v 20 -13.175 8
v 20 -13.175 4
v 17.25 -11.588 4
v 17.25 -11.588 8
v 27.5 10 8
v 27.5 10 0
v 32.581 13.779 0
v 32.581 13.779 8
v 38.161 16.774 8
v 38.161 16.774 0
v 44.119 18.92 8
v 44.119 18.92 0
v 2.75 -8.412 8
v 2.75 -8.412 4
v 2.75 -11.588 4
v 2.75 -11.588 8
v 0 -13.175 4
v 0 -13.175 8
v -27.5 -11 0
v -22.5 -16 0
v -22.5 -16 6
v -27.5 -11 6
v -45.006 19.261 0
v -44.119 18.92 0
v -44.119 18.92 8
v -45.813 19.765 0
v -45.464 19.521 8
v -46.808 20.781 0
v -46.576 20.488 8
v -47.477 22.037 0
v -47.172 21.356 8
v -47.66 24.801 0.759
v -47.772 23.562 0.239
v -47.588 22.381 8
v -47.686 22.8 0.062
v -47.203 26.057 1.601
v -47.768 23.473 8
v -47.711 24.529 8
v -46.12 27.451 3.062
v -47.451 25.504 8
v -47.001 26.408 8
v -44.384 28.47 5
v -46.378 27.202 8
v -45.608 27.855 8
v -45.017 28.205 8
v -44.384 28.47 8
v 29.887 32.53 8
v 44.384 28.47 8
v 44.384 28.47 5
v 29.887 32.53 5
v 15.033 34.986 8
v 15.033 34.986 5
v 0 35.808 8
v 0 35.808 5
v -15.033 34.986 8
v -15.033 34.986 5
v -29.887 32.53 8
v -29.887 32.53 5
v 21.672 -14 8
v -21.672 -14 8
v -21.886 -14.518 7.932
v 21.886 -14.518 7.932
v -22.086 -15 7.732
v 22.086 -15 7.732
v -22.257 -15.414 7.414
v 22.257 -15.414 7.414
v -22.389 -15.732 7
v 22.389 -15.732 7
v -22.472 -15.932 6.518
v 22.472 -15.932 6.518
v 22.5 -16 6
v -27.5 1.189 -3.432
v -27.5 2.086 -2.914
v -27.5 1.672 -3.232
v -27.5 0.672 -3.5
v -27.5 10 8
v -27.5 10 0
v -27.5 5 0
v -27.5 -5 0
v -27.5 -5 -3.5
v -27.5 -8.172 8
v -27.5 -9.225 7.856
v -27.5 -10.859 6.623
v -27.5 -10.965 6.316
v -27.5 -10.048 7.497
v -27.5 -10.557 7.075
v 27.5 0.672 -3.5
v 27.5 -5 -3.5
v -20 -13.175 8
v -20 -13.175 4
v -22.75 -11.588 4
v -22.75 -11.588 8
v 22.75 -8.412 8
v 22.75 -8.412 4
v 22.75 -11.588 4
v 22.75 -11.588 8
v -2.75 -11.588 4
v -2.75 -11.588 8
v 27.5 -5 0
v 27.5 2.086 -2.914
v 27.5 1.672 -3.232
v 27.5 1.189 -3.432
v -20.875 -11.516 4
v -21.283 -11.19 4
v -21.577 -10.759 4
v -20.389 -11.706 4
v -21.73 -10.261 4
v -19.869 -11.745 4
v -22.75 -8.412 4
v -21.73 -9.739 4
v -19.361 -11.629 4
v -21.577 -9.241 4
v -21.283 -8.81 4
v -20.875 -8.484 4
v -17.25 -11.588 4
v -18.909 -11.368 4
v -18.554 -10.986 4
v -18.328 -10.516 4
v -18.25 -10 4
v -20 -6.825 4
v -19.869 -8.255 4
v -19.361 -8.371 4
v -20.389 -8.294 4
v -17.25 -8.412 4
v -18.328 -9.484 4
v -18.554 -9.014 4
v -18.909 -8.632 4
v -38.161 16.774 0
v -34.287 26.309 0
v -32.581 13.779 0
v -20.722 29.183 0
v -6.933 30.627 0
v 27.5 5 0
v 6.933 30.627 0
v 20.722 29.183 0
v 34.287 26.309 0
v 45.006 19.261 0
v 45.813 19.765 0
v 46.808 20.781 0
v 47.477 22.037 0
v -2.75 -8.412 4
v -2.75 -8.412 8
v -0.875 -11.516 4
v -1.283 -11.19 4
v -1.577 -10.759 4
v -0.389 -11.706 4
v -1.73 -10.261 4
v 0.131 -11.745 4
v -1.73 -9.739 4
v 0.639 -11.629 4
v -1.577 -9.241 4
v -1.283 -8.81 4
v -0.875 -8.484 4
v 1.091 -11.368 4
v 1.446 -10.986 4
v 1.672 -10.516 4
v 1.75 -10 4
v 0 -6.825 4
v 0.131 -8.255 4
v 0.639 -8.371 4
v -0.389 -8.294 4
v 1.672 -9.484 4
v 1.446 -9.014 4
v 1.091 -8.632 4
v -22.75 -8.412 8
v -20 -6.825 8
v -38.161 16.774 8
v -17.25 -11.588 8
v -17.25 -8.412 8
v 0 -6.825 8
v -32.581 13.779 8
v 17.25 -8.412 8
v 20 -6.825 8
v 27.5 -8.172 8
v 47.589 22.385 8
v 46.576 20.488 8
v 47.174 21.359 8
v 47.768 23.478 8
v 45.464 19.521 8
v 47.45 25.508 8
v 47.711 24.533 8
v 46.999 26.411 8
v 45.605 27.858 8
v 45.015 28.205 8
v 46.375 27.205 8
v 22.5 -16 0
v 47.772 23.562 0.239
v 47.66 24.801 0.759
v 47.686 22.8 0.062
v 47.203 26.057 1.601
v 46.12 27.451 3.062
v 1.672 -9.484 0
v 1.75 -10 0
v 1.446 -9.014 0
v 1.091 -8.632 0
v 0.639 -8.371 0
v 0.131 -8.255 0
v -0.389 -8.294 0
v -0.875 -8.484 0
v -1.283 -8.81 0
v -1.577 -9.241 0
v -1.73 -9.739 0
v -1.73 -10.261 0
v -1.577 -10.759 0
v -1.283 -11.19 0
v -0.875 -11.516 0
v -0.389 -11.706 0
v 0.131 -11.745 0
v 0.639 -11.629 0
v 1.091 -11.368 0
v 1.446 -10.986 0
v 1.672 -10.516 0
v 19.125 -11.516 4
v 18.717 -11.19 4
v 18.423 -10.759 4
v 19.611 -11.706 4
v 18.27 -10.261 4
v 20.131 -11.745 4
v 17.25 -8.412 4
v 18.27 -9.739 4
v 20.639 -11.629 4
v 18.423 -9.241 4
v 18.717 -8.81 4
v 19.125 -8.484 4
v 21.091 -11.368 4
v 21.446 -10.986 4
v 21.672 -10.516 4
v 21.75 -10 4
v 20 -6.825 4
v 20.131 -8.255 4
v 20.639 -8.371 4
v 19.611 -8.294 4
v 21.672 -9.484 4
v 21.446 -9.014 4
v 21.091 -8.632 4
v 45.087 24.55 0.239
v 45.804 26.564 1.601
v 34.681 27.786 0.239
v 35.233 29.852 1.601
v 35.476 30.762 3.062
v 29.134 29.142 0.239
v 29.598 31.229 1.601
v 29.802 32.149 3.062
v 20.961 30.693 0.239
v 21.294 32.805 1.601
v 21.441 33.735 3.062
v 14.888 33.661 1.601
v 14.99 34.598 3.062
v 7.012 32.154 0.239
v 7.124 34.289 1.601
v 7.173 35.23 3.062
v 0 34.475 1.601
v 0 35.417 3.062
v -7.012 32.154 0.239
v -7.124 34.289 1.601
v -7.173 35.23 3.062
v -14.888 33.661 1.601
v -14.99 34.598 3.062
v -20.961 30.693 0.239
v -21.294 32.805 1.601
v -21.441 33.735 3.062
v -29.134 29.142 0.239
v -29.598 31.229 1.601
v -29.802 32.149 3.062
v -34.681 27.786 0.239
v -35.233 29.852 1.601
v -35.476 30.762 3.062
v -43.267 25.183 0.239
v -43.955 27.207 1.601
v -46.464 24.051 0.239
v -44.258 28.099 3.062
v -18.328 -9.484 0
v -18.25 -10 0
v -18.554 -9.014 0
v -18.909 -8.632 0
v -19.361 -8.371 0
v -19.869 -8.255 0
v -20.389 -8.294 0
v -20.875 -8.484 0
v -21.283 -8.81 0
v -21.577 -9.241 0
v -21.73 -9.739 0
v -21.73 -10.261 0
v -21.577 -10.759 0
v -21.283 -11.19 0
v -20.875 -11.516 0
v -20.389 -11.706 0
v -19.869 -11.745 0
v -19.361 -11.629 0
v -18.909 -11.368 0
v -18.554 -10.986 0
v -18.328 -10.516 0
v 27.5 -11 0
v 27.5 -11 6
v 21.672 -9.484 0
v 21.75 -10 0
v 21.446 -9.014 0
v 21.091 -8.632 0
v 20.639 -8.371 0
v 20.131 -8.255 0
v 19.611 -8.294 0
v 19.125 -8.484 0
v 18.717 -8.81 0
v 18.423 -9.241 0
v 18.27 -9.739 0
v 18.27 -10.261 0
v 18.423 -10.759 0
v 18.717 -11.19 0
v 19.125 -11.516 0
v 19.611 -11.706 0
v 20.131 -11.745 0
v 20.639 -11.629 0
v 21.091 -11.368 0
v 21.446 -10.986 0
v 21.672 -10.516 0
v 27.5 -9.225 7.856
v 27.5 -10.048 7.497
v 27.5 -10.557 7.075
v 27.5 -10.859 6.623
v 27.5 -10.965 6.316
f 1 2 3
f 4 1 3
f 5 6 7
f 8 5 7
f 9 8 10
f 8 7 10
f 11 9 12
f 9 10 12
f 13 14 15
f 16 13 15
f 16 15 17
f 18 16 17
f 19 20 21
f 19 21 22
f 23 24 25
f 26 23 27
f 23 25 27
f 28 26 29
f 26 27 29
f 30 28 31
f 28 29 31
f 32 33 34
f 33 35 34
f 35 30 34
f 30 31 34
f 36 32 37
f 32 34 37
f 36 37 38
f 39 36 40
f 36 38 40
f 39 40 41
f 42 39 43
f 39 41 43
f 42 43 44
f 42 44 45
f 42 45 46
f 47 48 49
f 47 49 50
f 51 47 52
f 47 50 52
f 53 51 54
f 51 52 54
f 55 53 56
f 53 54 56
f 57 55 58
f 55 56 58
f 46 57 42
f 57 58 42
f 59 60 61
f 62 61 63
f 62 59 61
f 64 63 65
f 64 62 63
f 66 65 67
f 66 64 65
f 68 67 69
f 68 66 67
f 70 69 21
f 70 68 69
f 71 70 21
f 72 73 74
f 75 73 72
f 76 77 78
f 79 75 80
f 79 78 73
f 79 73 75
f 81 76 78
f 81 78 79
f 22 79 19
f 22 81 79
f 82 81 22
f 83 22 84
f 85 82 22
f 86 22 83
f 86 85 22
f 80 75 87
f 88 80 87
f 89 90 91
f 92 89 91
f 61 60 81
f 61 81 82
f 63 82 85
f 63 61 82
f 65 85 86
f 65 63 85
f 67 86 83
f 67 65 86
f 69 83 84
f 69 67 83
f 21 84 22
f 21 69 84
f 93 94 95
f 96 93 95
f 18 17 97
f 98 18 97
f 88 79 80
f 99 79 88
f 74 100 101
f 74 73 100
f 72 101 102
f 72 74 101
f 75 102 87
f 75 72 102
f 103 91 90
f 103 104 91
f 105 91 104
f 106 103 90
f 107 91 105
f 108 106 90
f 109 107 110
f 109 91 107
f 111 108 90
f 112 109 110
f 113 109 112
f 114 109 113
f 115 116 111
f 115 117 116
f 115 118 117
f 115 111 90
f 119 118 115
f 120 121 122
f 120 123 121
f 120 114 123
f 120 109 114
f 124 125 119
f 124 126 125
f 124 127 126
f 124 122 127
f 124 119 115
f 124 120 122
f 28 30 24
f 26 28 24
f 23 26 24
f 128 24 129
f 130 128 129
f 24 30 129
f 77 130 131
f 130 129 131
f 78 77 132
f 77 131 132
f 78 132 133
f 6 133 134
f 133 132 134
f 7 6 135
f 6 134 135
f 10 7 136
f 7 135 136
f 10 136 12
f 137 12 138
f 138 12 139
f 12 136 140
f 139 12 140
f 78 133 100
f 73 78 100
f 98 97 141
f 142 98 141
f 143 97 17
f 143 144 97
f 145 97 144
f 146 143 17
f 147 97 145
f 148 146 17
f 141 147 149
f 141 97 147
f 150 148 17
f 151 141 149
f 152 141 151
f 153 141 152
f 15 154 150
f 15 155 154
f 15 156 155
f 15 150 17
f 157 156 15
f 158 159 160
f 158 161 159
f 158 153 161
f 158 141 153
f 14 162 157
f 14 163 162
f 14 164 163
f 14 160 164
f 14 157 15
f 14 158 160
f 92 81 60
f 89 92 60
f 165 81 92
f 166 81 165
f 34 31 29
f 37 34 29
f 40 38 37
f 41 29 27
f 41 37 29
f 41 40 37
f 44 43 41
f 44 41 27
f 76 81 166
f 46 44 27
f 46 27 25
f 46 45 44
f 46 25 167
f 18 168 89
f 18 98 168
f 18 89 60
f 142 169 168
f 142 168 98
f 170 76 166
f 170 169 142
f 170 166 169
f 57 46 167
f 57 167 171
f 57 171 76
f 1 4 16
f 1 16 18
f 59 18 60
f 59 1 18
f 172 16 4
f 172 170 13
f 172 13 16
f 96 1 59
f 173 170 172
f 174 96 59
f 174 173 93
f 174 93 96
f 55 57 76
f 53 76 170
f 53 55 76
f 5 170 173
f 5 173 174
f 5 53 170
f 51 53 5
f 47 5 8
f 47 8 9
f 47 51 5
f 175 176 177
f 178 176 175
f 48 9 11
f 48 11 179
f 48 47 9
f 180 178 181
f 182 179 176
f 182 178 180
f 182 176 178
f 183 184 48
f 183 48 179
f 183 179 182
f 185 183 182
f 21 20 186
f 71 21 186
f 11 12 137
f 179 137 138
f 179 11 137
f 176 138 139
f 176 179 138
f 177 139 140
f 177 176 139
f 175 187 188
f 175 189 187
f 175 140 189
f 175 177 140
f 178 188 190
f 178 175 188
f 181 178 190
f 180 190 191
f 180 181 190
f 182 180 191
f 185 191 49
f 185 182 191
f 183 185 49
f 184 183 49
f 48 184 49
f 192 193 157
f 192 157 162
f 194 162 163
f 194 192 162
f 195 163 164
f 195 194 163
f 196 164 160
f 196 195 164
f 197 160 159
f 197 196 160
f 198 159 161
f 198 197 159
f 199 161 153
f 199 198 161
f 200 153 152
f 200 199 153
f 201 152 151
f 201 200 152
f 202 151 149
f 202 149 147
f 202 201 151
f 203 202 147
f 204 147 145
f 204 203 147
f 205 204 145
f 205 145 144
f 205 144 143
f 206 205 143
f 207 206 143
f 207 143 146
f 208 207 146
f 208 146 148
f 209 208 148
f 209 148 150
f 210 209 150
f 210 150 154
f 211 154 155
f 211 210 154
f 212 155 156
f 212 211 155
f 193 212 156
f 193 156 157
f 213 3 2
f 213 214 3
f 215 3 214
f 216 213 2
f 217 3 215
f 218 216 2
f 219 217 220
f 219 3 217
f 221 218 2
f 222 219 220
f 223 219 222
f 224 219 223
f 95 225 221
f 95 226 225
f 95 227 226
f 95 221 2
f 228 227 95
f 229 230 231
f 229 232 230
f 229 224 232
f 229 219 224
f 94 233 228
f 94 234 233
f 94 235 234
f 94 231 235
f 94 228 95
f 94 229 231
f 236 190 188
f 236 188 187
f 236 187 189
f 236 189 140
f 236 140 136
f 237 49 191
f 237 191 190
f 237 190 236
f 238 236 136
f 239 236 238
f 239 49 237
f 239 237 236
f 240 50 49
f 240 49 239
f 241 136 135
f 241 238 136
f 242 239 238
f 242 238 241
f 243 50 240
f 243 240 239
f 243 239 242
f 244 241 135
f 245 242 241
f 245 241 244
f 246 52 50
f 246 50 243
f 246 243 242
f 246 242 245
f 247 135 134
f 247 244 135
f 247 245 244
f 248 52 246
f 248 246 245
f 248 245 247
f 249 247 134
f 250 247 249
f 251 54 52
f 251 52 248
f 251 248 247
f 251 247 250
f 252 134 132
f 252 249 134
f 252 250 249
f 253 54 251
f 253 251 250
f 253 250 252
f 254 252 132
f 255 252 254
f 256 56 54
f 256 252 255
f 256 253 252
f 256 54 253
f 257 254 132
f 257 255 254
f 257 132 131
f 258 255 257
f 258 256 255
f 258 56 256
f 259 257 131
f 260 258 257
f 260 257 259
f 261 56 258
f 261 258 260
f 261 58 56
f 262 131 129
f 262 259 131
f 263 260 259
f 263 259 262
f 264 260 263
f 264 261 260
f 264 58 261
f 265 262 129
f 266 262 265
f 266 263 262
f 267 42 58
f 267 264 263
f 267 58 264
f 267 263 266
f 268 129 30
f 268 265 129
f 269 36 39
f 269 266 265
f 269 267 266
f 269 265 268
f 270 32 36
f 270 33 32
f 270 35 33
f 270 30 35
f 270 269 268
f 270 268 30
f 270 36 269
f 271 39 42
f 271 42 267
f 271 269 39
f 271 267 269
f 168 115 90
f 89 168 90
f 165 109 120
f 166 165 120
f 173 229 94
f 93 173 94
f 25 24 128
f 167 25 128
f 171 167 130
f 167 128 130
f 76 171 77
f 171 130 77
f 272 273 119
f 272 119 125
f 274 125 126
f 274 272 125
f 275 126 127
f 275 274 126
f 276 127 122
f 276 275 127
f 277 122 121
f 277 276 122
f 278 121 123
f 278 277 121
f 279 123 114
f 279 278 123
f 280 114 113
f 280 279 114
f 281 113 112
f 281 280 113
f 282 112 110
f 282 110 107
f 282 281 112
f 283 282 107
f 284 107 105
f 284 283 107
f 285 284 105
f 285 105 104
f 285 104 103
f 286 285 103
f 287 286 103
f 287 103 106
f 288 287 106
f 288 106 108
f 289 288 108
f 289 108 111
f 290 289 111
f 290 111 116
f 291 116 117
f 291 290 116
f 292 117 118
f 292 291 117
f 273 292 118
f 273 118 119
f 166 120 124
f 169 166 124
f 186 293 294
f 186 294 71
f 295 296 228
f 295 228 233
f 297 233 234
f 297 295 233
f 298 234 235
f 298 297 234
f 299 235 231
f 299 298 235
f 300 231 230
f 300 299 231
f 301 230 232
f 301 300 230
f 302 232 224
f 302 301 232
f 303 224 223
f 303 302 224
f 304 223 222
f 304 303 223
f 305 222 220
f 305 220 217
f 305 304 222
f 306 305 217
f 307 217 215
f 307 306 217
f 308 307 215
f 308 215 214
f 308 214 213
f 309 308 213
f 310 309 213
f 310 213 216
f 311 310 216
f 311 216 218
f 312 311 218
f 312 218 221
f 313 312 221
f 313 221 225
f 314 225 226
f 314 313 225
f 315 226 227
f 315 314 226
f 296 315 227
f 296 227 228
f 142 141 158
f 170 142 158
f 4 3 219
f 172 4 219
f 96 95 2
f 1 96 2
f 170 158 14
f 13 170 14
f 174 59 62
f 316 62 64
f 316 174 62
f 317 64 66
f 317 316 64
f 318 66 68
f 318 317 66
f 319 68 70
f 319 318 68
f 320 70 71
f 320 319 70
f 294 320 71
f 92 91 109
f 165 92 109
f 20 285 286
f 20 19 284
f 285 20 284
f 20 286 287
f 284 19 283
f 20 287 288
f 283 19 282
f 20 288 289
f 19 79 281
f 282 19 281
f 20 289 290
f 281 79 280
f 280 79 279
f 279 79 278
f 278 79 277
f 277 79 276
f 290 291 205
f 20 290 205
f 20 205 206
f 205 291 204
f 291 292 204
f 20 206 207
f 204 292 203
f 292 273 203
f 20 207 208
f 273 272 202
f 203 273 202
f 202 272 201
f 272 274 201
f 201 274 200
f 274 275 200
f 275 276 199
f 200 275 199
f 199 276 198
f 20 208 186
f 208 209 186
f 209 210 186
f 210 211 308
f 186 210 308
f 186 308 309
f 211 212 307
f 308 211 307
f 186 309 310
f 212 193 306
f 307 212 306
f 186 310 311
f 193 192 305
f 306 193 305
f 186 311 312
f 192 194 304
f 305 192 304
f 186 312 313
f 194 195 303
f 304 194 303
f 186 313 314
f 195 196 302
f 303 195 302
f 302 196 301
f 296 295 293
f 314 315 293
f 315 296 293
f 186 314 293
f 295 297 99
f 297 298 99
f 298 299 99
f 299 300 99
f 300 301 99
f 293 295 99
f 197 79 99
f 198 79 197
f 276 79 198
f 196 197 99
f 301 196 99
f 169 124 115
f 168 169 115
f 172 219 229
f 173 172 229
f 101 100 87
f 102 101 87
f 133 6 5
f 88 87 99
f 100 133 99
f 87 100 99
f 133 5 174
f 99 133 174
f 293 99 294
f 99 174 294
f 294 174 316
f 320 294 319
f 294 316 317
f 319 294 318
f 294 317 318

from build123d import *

# Parameters (mm, degrees)
F1_W        = 55
F1_H        = 5
F1_H_2      = 11
F2_DEPTH    = 8
F1_R        = 1.75
F3_DEPTH    = 4
F4_DEPTH    = 3.5
F5_T4_DEPTH = 55
F5_T6_DEPTH = 33.7168298797
F6_R        = 5
F7_R        = 2


# Not quite as in the source:
# - a fillet or chamfer that OpenCascade refuses, or shapes differently, is made with other operations: its cross-section is extruded or revolved along the edge and cut away or added
# - a feature names something its author has since deleted; it is built from what else it names


with BuildPart() as f2:
    # F1 (on Top) → F2 (new body)
    with BuildSketch(Plane.XY):
        with BuildLine():
            Line((-27.5, 10), (-27.5, 0))
            Line((-27.5, 0), (27.5, 0))
            Line((27.5, 0), (27.5, 10))
            ThreePointArc((27.5, 10), (45.1645357284, 19.1976835871), (65.078124404, 19.4843749404))
            ThreePointArc((65.078124404, 19.4843749404), (0, 35.8083822448), (-65.078124404, 19.4843749404))
            ThreePointArc((-65.078124404, 19.4843749404), (-45.1645357284, 19.1976835871), (-27.5, 10))
        make_face()
        with Locations((0, -2.5)):
            Rectangle(F1_W, F1_H)
        with Locations((0, -10.5)):
            Rectangle(F1_W, F1_H_2)
        Polygon((-20, -13.1754264805), (-22.75, -11.5877132403), (-22.75, -8.4122867597), (-20, -6.8245735195), (-17.25, -8.4122867597), (-17.25, -11.5877132403), align=None, mode=Mode.SUBTRACT)
        Polygon((0, -13.1754264805), (-2.75, -11.5877132403), (-2.75, -8.4122867597), (0, -6.8245735195), (2.75, -8.4122867597), (2.75, -11.5877132403), align=None, mode=Mode.SUBTRACT)
        Polygon((20, -13.1754264805), (17.25, -11.5877132403), (17.25, -8.4122867597), (20, -6.8245735195), (22.75, -8.4122867597), (22.75, -11.5877132403), align=None, mode=Mode.SUBTRACT)
    extrude(amount=F2_DEPTH)

    # F1 (on Top) → F3 (join)
    with BuildSketch(Plane.XY):
        Polygon((-22.75, -8.4122867597), (-22.75, -11.5877132403), (-20, -13.1754264805), (-17.25, -11.5877132403), (-17.25, -8.4122867597), (-20, -6.8245735195), align=None)
        with Locations((-20, -10)):
            Circle(F1_R, mode=Mode.SUBTRACT)
        Polygon((-2.75, -8.4122867597), (-2.75, -11.5877132403), (0, -13.1754264805), (2.75, -11.5877132403), (2.75, -8.4122867597), (0, -6.8245735195), align=None)
        with Locations((0, -10)):
            Circle(F1_R, mode=Mode.SUBTRACT)
        Polygon((17.25, -8.4122867597), (17.25, -11.5877132403), (20, -13.1754264805), (22.75, -11.5877132403), (22.75, -8.4122867597), (20, -6.8245735195), align=None)
        with Locations((20, -10)):
            Circle(F1_R, mode=Mode.SUBTRACT)
    extrude(amount=F3_DEPTH)

    # F1 (on Top) → F4 (join)
    with BuildSketch(Plane.XY):
        with Locations((0, -2.5)):
            Rectangle(F1_W, F1_H)
    extrude(amount=-F4_DEPTH)

    # F5: chamfer of 5 on 3 edges, made by hand


with BuildPart() as f5_tool2:
    # F5_s3 → F5_t4 (new body)
    with BuildSketch(Plane.YZ.offset(27.5)):
        Polygon((5, 0), (0, -5), (0, 0), align=None)
    extrude(amount=-F5_T4_DEPTH)

    split(bisect_by=Plane.XY.offset(-3.5), keep=Keep.TOP)


with BuildPart() as f2_1:
    add(f2.part)

    # F5_t1: union F5_tool2
    add(f5_tool2.part)

    # F5_s7 → F5_t6 (cut)
    with BuildSketch(Plane.XY.offset(-12.8584149398)):
        Polygon((-22.5, -16), (-27.5, -11), (-27.5, -16), align=None)
        Polygon((27.5, -11), (22.5, -16), (27.5, -16), align=None)
    extrude(amount=F5_T6_DEPTH, mode=Mode.SUBTRACT)

    # F6
    f6_edges = [f2_1.edges().sort_by_distance(p)[0] for p in [
        (0, 35.808382, 0),
        (-65.078124, 19.484375, 4),
        (65.078124, 19.484375, 4),
    ]]
    fillet(f6_edges, radius=F6_R)

    # F7
    f7_edges = [f2_1.edges().sort_by_distance(p)[0] for p in [
        (0, -16, 8),
        (-25, -13.5, 8),
        (25, -13.5, 8),
        (0, 1.5, -3.5),
    ]]
    fillet(f7_edges, radius=F7_R)


solid = f2_1.part
